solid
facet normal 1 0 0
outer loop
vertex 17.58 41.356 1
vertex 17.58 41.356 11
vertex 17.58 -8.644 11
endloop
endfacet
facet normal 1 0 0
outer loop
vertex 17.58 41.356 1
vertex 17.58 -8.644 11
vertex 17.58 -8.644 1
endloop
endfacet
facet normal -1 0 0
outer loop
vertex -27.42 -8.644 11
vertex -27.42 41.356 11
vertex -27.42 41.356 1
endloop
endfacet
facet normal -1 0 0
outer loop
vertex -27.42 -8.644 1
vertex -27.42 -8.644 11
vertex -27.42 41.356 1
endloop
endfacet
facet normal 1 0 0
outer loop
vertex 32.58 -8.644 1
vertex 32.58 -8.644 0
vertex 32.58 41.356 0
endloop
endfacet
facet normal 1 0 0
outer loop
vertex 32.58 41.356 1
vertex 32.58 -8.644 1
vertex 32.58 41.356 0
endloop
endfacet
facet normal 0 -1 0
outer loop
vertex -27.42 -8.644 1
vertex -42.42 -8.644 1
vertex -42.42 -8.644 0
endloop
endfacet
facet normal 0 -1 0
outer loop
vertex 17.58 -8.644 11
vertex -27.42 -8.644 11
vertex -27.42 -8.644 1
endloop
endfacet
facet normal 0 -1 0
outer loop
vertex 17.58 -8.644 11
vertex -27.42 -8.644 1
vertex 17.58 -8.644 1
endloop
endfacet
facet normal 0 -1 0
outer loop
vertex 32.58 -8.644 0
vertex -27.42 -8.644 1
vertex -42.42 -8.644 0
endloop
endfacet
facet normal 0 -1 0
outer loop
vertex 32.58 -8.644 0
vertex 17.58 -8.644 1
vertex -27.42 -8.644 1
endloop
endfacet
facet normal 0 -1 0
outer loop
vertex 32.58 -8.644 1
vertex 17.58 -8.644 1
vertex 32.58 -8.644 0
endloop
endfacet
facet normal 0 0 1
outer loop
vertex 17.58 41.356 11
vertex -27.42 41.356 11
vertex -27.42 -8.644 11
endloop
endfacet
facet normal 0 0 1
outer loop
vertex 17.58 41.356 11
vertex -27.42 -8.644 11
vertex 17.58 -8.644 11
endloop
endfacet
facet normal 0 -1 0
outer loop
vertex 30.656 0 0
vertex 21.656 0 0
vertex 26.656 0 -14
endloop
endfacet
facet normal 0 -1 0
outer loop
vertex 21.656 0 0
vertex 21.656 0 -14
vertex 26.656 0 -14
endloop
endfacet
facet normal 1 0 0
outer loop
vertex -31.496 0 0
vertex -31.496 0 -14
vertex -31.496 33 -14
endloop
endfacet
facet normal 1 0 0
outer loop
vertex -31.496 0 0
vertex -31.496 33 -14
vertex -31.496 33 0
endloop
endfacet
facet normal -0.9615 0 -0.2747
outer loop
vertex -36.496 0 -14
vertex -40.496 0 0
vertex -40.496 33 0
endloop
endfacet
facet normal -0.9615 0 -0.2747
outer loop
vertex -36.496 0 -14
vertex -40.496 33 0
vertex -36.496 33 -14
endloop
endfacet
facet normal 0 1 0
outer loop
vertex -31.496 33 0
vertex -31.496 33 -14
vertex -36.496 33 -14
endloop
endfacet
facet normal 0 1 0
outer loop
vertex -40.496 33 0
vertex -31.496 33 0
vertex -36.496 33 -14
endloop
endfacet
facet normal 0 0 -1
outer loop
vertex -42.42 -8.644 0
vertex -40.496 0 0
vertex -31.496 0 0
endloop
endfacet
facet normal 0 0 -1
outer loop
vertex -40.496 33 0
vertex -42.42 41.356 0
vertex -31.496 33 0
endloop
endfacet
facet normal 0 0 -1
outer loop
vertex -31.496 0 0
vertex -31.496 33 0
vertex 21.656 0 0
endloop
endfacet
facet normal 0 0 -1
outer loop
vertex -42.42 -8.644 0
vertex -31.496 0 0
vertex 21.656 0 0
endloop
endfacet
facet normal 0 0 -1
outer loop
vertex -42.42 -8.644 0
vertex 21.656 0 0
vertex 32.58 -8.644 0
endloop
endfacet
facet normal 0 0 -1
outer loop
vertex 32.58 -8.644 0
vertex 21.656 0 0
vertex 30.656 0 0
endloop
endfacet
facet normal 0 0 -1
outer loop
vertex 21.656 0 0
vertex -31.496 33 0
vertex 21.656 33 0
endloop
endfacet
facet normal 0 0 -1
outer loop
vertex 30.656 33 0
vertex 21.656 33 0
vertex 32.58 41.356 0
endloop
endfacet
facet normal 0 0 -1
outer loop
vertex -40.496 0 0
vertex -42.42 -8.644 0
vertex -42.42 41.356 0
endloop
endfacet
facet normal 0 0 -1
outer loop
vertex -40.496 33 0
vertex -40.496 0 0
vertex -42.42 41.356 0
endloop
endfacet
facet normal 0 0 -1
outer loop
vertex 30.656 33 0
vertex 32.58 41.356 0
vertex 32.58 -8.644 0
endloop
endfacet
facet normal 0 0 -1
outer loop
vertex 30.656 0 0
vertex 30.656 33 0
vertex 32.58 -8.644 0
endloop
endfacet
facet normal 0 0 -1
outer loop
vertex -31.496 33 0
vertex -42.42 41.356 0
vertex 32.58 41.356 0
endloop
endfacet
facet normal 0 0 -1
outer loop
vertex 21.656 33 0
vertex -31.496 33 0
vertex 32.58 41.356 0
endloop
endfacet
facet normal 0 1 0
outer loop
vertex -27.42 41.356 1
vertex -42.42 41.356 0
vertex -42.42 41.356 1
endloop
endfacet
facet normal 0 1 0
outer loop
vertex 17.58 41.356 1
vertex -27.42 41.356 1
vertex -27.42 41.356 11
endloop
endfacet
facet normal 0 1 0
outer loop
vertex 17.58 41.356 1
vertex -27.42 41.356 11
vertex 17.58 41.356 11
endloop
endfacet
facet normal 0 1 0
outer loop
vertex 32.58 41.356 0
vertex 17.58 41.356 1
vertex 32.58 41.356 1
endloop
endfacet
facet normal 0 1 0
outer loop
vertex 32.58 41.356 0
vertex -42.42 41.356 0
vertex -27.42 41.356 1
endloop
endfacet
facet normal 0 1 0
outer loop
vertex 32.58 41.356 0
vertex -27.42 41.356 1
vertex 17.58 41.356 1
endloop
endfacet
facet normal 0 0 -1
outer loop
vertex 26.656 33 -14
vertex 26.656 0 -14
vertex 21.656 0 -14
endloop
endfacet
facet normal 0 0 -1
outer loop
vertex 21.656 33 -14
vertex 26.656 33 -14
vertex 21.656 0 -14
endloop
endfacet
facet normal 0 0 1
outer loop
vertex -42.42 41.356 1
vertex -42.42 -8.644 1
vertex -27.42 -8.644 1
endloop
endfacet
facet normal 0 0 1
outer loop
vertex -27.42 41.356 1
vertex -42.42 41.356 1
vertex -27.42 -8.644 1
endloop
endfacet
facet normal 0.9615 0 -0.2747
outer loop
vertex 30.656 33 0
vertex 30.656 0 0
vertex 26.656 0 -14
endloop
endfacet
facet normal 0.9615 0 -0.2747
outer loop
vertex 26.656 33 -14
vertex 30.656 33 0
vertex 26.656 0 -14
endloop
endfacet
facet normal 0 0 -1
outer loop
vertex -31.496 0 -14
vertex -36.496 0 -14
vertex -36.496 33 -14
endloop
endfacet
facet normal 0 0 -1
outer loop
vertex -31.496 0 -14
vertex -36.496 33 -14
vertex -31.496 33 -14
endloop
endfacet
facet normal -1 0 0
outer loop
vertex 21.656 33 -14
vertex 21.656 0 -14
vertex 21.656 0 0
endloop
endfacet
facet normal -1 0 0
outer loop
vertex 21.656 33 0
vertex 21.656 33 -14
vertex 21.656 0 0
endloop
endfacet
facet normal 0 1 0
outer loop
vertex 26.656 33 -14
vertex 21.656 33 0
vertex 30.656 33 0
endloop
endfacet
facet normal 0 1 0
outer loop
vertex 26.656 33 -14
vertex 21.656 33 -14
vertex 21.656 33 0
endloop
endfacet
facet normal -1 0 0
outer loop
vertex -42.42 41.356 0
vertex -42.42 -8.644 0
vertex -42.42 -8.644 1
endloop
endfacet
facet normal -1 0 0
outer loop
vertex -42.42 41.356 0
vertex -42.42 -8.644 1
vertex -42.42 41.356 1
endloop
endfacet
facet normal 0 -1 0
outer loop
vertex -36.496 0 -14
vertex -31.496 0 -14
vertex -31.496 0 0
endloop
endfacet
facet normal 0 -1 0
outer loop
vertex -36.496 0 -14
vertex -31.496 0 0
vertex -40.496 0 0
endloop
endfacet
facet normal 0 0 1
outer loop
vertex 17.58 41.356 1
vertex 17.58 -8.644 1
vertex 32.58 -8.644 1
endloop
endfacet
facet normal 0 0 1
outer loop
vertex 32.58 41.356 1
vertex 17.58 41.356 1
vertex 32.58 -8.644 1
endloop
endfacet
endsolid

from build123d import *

# Parameters (mm, degrees)
SKETCH1_W                       = 75
SKETCH1_H                       = 50
BOSS_EXTRUDE1_DEPTH             = 1
BOSS_EXTRUDE2_REACH             = 43.356
SKETCH2_W                       = 45
SKETCH2_H                       = 10
BOSS_EXTRUDE2_DIRECTION_2_REACH = 10.644
BOSS_EXTRUDE5_DEPTH             = 33


with BuildPart() as part:
    # Sketch1 → Boss-Extrude1 (new body)
    with BuildSketch(Plane.XY):
        with Locations((-4.920212766, 16.356382979)):
            Rectangle(SKETCH1_W, SKETCH1_H)
    extrude(amount=BOSS_EXTRUDE1_DEPTH)

    # Boss-Extrude2: up to this face of the body (flat: up to its plane)
    boss_extrude2_end = Plane(part.part.faces().sort_by_distance((-4.920212766, 41.356382979, 0.5))[0])
    # Sketch2 → Boss-Extrude2 (add, up to the picked face)
    with BuildSketch(Plane(origin=(0, 0, 0), x_dir=(1, 0, 0), z_dir=(0, 1, 0)), mode=Mode.PRIVATE) as boss_extrude2_sk1:
        with Locations((-4.920212766, -6)):
            Rectangle(SKETCH2_W, SKETCH2_H)
    boss_extrude2_tool1 = split(extrude(boss_extrude2_sk1.sketch, amount=BOSS_EXTRUDE2_REACH, mode=Mode.PRIVATE), bisect_by=boss_extrude2_end, keep=Keep.BOTH, mode=Mode.PRIVATE)
    add(boss_extrude2_tool1.solids().sort_by_distance((-4.920213, 0, 6))[0])

    # Boss-Extrude2 direction 2: up to this face of the body (flat: up to its plane)
    boss_extrude2_direction_2_end = Plane(part.part.faces().sort_by_distance((-4.920212766, -8.643617021, 0.5))[0])
    # Sketch2 → Boss-Extrude2 direction 2 (add, up to the picked face)
    with BuildSketch(Plane(origin=(0, 0, 0), x_dir=(1, 0, 0), z_dir=(0, 1, 0)), mode=Mode.PRIVATE) as boss_extrude2_direction_2_sk1:
        with Locations((-4.920212766, -6)):
            Rectangle(SKETCH2_W, SKETCH2_H)
    boss_extrude2_direction_2_tool1 = split(extrude(boss_extrude2_direction_2_sk1.sketch, amount=-BOSS_EXTRUDE2_DIRECTION_2_REACH, mode=Mode.PRIVATE), bisect_by=boss_extrude2_direction_2_end, keep=Keep.BOTH, mode=Mode.PRIVATE)
    add(boss_extrude2_direction_2_tool1.solids().sort_by_distance((-4.920213, 0, 6))[0])

    # Sketch4 → Boss-Extrude5 (add)
    with BuildSketch(Plane(origin=(0, 0, 0), x_dir=(1, 0, 0), z_dir=(0, 1, 0))):
        Polygon((-40.49649997, 0), (-36.49649997, 14), (-31.49649997, 14), (-31.49649997, 0), align=None)
        Polygon((21.656074438, 0), (30.656074438, 0), (26.656074438, 14), (21.656074438, 14), align=None)
    extrude(amount=BOSS_EXTRUDE5_DEPTH)


solid = part.part
